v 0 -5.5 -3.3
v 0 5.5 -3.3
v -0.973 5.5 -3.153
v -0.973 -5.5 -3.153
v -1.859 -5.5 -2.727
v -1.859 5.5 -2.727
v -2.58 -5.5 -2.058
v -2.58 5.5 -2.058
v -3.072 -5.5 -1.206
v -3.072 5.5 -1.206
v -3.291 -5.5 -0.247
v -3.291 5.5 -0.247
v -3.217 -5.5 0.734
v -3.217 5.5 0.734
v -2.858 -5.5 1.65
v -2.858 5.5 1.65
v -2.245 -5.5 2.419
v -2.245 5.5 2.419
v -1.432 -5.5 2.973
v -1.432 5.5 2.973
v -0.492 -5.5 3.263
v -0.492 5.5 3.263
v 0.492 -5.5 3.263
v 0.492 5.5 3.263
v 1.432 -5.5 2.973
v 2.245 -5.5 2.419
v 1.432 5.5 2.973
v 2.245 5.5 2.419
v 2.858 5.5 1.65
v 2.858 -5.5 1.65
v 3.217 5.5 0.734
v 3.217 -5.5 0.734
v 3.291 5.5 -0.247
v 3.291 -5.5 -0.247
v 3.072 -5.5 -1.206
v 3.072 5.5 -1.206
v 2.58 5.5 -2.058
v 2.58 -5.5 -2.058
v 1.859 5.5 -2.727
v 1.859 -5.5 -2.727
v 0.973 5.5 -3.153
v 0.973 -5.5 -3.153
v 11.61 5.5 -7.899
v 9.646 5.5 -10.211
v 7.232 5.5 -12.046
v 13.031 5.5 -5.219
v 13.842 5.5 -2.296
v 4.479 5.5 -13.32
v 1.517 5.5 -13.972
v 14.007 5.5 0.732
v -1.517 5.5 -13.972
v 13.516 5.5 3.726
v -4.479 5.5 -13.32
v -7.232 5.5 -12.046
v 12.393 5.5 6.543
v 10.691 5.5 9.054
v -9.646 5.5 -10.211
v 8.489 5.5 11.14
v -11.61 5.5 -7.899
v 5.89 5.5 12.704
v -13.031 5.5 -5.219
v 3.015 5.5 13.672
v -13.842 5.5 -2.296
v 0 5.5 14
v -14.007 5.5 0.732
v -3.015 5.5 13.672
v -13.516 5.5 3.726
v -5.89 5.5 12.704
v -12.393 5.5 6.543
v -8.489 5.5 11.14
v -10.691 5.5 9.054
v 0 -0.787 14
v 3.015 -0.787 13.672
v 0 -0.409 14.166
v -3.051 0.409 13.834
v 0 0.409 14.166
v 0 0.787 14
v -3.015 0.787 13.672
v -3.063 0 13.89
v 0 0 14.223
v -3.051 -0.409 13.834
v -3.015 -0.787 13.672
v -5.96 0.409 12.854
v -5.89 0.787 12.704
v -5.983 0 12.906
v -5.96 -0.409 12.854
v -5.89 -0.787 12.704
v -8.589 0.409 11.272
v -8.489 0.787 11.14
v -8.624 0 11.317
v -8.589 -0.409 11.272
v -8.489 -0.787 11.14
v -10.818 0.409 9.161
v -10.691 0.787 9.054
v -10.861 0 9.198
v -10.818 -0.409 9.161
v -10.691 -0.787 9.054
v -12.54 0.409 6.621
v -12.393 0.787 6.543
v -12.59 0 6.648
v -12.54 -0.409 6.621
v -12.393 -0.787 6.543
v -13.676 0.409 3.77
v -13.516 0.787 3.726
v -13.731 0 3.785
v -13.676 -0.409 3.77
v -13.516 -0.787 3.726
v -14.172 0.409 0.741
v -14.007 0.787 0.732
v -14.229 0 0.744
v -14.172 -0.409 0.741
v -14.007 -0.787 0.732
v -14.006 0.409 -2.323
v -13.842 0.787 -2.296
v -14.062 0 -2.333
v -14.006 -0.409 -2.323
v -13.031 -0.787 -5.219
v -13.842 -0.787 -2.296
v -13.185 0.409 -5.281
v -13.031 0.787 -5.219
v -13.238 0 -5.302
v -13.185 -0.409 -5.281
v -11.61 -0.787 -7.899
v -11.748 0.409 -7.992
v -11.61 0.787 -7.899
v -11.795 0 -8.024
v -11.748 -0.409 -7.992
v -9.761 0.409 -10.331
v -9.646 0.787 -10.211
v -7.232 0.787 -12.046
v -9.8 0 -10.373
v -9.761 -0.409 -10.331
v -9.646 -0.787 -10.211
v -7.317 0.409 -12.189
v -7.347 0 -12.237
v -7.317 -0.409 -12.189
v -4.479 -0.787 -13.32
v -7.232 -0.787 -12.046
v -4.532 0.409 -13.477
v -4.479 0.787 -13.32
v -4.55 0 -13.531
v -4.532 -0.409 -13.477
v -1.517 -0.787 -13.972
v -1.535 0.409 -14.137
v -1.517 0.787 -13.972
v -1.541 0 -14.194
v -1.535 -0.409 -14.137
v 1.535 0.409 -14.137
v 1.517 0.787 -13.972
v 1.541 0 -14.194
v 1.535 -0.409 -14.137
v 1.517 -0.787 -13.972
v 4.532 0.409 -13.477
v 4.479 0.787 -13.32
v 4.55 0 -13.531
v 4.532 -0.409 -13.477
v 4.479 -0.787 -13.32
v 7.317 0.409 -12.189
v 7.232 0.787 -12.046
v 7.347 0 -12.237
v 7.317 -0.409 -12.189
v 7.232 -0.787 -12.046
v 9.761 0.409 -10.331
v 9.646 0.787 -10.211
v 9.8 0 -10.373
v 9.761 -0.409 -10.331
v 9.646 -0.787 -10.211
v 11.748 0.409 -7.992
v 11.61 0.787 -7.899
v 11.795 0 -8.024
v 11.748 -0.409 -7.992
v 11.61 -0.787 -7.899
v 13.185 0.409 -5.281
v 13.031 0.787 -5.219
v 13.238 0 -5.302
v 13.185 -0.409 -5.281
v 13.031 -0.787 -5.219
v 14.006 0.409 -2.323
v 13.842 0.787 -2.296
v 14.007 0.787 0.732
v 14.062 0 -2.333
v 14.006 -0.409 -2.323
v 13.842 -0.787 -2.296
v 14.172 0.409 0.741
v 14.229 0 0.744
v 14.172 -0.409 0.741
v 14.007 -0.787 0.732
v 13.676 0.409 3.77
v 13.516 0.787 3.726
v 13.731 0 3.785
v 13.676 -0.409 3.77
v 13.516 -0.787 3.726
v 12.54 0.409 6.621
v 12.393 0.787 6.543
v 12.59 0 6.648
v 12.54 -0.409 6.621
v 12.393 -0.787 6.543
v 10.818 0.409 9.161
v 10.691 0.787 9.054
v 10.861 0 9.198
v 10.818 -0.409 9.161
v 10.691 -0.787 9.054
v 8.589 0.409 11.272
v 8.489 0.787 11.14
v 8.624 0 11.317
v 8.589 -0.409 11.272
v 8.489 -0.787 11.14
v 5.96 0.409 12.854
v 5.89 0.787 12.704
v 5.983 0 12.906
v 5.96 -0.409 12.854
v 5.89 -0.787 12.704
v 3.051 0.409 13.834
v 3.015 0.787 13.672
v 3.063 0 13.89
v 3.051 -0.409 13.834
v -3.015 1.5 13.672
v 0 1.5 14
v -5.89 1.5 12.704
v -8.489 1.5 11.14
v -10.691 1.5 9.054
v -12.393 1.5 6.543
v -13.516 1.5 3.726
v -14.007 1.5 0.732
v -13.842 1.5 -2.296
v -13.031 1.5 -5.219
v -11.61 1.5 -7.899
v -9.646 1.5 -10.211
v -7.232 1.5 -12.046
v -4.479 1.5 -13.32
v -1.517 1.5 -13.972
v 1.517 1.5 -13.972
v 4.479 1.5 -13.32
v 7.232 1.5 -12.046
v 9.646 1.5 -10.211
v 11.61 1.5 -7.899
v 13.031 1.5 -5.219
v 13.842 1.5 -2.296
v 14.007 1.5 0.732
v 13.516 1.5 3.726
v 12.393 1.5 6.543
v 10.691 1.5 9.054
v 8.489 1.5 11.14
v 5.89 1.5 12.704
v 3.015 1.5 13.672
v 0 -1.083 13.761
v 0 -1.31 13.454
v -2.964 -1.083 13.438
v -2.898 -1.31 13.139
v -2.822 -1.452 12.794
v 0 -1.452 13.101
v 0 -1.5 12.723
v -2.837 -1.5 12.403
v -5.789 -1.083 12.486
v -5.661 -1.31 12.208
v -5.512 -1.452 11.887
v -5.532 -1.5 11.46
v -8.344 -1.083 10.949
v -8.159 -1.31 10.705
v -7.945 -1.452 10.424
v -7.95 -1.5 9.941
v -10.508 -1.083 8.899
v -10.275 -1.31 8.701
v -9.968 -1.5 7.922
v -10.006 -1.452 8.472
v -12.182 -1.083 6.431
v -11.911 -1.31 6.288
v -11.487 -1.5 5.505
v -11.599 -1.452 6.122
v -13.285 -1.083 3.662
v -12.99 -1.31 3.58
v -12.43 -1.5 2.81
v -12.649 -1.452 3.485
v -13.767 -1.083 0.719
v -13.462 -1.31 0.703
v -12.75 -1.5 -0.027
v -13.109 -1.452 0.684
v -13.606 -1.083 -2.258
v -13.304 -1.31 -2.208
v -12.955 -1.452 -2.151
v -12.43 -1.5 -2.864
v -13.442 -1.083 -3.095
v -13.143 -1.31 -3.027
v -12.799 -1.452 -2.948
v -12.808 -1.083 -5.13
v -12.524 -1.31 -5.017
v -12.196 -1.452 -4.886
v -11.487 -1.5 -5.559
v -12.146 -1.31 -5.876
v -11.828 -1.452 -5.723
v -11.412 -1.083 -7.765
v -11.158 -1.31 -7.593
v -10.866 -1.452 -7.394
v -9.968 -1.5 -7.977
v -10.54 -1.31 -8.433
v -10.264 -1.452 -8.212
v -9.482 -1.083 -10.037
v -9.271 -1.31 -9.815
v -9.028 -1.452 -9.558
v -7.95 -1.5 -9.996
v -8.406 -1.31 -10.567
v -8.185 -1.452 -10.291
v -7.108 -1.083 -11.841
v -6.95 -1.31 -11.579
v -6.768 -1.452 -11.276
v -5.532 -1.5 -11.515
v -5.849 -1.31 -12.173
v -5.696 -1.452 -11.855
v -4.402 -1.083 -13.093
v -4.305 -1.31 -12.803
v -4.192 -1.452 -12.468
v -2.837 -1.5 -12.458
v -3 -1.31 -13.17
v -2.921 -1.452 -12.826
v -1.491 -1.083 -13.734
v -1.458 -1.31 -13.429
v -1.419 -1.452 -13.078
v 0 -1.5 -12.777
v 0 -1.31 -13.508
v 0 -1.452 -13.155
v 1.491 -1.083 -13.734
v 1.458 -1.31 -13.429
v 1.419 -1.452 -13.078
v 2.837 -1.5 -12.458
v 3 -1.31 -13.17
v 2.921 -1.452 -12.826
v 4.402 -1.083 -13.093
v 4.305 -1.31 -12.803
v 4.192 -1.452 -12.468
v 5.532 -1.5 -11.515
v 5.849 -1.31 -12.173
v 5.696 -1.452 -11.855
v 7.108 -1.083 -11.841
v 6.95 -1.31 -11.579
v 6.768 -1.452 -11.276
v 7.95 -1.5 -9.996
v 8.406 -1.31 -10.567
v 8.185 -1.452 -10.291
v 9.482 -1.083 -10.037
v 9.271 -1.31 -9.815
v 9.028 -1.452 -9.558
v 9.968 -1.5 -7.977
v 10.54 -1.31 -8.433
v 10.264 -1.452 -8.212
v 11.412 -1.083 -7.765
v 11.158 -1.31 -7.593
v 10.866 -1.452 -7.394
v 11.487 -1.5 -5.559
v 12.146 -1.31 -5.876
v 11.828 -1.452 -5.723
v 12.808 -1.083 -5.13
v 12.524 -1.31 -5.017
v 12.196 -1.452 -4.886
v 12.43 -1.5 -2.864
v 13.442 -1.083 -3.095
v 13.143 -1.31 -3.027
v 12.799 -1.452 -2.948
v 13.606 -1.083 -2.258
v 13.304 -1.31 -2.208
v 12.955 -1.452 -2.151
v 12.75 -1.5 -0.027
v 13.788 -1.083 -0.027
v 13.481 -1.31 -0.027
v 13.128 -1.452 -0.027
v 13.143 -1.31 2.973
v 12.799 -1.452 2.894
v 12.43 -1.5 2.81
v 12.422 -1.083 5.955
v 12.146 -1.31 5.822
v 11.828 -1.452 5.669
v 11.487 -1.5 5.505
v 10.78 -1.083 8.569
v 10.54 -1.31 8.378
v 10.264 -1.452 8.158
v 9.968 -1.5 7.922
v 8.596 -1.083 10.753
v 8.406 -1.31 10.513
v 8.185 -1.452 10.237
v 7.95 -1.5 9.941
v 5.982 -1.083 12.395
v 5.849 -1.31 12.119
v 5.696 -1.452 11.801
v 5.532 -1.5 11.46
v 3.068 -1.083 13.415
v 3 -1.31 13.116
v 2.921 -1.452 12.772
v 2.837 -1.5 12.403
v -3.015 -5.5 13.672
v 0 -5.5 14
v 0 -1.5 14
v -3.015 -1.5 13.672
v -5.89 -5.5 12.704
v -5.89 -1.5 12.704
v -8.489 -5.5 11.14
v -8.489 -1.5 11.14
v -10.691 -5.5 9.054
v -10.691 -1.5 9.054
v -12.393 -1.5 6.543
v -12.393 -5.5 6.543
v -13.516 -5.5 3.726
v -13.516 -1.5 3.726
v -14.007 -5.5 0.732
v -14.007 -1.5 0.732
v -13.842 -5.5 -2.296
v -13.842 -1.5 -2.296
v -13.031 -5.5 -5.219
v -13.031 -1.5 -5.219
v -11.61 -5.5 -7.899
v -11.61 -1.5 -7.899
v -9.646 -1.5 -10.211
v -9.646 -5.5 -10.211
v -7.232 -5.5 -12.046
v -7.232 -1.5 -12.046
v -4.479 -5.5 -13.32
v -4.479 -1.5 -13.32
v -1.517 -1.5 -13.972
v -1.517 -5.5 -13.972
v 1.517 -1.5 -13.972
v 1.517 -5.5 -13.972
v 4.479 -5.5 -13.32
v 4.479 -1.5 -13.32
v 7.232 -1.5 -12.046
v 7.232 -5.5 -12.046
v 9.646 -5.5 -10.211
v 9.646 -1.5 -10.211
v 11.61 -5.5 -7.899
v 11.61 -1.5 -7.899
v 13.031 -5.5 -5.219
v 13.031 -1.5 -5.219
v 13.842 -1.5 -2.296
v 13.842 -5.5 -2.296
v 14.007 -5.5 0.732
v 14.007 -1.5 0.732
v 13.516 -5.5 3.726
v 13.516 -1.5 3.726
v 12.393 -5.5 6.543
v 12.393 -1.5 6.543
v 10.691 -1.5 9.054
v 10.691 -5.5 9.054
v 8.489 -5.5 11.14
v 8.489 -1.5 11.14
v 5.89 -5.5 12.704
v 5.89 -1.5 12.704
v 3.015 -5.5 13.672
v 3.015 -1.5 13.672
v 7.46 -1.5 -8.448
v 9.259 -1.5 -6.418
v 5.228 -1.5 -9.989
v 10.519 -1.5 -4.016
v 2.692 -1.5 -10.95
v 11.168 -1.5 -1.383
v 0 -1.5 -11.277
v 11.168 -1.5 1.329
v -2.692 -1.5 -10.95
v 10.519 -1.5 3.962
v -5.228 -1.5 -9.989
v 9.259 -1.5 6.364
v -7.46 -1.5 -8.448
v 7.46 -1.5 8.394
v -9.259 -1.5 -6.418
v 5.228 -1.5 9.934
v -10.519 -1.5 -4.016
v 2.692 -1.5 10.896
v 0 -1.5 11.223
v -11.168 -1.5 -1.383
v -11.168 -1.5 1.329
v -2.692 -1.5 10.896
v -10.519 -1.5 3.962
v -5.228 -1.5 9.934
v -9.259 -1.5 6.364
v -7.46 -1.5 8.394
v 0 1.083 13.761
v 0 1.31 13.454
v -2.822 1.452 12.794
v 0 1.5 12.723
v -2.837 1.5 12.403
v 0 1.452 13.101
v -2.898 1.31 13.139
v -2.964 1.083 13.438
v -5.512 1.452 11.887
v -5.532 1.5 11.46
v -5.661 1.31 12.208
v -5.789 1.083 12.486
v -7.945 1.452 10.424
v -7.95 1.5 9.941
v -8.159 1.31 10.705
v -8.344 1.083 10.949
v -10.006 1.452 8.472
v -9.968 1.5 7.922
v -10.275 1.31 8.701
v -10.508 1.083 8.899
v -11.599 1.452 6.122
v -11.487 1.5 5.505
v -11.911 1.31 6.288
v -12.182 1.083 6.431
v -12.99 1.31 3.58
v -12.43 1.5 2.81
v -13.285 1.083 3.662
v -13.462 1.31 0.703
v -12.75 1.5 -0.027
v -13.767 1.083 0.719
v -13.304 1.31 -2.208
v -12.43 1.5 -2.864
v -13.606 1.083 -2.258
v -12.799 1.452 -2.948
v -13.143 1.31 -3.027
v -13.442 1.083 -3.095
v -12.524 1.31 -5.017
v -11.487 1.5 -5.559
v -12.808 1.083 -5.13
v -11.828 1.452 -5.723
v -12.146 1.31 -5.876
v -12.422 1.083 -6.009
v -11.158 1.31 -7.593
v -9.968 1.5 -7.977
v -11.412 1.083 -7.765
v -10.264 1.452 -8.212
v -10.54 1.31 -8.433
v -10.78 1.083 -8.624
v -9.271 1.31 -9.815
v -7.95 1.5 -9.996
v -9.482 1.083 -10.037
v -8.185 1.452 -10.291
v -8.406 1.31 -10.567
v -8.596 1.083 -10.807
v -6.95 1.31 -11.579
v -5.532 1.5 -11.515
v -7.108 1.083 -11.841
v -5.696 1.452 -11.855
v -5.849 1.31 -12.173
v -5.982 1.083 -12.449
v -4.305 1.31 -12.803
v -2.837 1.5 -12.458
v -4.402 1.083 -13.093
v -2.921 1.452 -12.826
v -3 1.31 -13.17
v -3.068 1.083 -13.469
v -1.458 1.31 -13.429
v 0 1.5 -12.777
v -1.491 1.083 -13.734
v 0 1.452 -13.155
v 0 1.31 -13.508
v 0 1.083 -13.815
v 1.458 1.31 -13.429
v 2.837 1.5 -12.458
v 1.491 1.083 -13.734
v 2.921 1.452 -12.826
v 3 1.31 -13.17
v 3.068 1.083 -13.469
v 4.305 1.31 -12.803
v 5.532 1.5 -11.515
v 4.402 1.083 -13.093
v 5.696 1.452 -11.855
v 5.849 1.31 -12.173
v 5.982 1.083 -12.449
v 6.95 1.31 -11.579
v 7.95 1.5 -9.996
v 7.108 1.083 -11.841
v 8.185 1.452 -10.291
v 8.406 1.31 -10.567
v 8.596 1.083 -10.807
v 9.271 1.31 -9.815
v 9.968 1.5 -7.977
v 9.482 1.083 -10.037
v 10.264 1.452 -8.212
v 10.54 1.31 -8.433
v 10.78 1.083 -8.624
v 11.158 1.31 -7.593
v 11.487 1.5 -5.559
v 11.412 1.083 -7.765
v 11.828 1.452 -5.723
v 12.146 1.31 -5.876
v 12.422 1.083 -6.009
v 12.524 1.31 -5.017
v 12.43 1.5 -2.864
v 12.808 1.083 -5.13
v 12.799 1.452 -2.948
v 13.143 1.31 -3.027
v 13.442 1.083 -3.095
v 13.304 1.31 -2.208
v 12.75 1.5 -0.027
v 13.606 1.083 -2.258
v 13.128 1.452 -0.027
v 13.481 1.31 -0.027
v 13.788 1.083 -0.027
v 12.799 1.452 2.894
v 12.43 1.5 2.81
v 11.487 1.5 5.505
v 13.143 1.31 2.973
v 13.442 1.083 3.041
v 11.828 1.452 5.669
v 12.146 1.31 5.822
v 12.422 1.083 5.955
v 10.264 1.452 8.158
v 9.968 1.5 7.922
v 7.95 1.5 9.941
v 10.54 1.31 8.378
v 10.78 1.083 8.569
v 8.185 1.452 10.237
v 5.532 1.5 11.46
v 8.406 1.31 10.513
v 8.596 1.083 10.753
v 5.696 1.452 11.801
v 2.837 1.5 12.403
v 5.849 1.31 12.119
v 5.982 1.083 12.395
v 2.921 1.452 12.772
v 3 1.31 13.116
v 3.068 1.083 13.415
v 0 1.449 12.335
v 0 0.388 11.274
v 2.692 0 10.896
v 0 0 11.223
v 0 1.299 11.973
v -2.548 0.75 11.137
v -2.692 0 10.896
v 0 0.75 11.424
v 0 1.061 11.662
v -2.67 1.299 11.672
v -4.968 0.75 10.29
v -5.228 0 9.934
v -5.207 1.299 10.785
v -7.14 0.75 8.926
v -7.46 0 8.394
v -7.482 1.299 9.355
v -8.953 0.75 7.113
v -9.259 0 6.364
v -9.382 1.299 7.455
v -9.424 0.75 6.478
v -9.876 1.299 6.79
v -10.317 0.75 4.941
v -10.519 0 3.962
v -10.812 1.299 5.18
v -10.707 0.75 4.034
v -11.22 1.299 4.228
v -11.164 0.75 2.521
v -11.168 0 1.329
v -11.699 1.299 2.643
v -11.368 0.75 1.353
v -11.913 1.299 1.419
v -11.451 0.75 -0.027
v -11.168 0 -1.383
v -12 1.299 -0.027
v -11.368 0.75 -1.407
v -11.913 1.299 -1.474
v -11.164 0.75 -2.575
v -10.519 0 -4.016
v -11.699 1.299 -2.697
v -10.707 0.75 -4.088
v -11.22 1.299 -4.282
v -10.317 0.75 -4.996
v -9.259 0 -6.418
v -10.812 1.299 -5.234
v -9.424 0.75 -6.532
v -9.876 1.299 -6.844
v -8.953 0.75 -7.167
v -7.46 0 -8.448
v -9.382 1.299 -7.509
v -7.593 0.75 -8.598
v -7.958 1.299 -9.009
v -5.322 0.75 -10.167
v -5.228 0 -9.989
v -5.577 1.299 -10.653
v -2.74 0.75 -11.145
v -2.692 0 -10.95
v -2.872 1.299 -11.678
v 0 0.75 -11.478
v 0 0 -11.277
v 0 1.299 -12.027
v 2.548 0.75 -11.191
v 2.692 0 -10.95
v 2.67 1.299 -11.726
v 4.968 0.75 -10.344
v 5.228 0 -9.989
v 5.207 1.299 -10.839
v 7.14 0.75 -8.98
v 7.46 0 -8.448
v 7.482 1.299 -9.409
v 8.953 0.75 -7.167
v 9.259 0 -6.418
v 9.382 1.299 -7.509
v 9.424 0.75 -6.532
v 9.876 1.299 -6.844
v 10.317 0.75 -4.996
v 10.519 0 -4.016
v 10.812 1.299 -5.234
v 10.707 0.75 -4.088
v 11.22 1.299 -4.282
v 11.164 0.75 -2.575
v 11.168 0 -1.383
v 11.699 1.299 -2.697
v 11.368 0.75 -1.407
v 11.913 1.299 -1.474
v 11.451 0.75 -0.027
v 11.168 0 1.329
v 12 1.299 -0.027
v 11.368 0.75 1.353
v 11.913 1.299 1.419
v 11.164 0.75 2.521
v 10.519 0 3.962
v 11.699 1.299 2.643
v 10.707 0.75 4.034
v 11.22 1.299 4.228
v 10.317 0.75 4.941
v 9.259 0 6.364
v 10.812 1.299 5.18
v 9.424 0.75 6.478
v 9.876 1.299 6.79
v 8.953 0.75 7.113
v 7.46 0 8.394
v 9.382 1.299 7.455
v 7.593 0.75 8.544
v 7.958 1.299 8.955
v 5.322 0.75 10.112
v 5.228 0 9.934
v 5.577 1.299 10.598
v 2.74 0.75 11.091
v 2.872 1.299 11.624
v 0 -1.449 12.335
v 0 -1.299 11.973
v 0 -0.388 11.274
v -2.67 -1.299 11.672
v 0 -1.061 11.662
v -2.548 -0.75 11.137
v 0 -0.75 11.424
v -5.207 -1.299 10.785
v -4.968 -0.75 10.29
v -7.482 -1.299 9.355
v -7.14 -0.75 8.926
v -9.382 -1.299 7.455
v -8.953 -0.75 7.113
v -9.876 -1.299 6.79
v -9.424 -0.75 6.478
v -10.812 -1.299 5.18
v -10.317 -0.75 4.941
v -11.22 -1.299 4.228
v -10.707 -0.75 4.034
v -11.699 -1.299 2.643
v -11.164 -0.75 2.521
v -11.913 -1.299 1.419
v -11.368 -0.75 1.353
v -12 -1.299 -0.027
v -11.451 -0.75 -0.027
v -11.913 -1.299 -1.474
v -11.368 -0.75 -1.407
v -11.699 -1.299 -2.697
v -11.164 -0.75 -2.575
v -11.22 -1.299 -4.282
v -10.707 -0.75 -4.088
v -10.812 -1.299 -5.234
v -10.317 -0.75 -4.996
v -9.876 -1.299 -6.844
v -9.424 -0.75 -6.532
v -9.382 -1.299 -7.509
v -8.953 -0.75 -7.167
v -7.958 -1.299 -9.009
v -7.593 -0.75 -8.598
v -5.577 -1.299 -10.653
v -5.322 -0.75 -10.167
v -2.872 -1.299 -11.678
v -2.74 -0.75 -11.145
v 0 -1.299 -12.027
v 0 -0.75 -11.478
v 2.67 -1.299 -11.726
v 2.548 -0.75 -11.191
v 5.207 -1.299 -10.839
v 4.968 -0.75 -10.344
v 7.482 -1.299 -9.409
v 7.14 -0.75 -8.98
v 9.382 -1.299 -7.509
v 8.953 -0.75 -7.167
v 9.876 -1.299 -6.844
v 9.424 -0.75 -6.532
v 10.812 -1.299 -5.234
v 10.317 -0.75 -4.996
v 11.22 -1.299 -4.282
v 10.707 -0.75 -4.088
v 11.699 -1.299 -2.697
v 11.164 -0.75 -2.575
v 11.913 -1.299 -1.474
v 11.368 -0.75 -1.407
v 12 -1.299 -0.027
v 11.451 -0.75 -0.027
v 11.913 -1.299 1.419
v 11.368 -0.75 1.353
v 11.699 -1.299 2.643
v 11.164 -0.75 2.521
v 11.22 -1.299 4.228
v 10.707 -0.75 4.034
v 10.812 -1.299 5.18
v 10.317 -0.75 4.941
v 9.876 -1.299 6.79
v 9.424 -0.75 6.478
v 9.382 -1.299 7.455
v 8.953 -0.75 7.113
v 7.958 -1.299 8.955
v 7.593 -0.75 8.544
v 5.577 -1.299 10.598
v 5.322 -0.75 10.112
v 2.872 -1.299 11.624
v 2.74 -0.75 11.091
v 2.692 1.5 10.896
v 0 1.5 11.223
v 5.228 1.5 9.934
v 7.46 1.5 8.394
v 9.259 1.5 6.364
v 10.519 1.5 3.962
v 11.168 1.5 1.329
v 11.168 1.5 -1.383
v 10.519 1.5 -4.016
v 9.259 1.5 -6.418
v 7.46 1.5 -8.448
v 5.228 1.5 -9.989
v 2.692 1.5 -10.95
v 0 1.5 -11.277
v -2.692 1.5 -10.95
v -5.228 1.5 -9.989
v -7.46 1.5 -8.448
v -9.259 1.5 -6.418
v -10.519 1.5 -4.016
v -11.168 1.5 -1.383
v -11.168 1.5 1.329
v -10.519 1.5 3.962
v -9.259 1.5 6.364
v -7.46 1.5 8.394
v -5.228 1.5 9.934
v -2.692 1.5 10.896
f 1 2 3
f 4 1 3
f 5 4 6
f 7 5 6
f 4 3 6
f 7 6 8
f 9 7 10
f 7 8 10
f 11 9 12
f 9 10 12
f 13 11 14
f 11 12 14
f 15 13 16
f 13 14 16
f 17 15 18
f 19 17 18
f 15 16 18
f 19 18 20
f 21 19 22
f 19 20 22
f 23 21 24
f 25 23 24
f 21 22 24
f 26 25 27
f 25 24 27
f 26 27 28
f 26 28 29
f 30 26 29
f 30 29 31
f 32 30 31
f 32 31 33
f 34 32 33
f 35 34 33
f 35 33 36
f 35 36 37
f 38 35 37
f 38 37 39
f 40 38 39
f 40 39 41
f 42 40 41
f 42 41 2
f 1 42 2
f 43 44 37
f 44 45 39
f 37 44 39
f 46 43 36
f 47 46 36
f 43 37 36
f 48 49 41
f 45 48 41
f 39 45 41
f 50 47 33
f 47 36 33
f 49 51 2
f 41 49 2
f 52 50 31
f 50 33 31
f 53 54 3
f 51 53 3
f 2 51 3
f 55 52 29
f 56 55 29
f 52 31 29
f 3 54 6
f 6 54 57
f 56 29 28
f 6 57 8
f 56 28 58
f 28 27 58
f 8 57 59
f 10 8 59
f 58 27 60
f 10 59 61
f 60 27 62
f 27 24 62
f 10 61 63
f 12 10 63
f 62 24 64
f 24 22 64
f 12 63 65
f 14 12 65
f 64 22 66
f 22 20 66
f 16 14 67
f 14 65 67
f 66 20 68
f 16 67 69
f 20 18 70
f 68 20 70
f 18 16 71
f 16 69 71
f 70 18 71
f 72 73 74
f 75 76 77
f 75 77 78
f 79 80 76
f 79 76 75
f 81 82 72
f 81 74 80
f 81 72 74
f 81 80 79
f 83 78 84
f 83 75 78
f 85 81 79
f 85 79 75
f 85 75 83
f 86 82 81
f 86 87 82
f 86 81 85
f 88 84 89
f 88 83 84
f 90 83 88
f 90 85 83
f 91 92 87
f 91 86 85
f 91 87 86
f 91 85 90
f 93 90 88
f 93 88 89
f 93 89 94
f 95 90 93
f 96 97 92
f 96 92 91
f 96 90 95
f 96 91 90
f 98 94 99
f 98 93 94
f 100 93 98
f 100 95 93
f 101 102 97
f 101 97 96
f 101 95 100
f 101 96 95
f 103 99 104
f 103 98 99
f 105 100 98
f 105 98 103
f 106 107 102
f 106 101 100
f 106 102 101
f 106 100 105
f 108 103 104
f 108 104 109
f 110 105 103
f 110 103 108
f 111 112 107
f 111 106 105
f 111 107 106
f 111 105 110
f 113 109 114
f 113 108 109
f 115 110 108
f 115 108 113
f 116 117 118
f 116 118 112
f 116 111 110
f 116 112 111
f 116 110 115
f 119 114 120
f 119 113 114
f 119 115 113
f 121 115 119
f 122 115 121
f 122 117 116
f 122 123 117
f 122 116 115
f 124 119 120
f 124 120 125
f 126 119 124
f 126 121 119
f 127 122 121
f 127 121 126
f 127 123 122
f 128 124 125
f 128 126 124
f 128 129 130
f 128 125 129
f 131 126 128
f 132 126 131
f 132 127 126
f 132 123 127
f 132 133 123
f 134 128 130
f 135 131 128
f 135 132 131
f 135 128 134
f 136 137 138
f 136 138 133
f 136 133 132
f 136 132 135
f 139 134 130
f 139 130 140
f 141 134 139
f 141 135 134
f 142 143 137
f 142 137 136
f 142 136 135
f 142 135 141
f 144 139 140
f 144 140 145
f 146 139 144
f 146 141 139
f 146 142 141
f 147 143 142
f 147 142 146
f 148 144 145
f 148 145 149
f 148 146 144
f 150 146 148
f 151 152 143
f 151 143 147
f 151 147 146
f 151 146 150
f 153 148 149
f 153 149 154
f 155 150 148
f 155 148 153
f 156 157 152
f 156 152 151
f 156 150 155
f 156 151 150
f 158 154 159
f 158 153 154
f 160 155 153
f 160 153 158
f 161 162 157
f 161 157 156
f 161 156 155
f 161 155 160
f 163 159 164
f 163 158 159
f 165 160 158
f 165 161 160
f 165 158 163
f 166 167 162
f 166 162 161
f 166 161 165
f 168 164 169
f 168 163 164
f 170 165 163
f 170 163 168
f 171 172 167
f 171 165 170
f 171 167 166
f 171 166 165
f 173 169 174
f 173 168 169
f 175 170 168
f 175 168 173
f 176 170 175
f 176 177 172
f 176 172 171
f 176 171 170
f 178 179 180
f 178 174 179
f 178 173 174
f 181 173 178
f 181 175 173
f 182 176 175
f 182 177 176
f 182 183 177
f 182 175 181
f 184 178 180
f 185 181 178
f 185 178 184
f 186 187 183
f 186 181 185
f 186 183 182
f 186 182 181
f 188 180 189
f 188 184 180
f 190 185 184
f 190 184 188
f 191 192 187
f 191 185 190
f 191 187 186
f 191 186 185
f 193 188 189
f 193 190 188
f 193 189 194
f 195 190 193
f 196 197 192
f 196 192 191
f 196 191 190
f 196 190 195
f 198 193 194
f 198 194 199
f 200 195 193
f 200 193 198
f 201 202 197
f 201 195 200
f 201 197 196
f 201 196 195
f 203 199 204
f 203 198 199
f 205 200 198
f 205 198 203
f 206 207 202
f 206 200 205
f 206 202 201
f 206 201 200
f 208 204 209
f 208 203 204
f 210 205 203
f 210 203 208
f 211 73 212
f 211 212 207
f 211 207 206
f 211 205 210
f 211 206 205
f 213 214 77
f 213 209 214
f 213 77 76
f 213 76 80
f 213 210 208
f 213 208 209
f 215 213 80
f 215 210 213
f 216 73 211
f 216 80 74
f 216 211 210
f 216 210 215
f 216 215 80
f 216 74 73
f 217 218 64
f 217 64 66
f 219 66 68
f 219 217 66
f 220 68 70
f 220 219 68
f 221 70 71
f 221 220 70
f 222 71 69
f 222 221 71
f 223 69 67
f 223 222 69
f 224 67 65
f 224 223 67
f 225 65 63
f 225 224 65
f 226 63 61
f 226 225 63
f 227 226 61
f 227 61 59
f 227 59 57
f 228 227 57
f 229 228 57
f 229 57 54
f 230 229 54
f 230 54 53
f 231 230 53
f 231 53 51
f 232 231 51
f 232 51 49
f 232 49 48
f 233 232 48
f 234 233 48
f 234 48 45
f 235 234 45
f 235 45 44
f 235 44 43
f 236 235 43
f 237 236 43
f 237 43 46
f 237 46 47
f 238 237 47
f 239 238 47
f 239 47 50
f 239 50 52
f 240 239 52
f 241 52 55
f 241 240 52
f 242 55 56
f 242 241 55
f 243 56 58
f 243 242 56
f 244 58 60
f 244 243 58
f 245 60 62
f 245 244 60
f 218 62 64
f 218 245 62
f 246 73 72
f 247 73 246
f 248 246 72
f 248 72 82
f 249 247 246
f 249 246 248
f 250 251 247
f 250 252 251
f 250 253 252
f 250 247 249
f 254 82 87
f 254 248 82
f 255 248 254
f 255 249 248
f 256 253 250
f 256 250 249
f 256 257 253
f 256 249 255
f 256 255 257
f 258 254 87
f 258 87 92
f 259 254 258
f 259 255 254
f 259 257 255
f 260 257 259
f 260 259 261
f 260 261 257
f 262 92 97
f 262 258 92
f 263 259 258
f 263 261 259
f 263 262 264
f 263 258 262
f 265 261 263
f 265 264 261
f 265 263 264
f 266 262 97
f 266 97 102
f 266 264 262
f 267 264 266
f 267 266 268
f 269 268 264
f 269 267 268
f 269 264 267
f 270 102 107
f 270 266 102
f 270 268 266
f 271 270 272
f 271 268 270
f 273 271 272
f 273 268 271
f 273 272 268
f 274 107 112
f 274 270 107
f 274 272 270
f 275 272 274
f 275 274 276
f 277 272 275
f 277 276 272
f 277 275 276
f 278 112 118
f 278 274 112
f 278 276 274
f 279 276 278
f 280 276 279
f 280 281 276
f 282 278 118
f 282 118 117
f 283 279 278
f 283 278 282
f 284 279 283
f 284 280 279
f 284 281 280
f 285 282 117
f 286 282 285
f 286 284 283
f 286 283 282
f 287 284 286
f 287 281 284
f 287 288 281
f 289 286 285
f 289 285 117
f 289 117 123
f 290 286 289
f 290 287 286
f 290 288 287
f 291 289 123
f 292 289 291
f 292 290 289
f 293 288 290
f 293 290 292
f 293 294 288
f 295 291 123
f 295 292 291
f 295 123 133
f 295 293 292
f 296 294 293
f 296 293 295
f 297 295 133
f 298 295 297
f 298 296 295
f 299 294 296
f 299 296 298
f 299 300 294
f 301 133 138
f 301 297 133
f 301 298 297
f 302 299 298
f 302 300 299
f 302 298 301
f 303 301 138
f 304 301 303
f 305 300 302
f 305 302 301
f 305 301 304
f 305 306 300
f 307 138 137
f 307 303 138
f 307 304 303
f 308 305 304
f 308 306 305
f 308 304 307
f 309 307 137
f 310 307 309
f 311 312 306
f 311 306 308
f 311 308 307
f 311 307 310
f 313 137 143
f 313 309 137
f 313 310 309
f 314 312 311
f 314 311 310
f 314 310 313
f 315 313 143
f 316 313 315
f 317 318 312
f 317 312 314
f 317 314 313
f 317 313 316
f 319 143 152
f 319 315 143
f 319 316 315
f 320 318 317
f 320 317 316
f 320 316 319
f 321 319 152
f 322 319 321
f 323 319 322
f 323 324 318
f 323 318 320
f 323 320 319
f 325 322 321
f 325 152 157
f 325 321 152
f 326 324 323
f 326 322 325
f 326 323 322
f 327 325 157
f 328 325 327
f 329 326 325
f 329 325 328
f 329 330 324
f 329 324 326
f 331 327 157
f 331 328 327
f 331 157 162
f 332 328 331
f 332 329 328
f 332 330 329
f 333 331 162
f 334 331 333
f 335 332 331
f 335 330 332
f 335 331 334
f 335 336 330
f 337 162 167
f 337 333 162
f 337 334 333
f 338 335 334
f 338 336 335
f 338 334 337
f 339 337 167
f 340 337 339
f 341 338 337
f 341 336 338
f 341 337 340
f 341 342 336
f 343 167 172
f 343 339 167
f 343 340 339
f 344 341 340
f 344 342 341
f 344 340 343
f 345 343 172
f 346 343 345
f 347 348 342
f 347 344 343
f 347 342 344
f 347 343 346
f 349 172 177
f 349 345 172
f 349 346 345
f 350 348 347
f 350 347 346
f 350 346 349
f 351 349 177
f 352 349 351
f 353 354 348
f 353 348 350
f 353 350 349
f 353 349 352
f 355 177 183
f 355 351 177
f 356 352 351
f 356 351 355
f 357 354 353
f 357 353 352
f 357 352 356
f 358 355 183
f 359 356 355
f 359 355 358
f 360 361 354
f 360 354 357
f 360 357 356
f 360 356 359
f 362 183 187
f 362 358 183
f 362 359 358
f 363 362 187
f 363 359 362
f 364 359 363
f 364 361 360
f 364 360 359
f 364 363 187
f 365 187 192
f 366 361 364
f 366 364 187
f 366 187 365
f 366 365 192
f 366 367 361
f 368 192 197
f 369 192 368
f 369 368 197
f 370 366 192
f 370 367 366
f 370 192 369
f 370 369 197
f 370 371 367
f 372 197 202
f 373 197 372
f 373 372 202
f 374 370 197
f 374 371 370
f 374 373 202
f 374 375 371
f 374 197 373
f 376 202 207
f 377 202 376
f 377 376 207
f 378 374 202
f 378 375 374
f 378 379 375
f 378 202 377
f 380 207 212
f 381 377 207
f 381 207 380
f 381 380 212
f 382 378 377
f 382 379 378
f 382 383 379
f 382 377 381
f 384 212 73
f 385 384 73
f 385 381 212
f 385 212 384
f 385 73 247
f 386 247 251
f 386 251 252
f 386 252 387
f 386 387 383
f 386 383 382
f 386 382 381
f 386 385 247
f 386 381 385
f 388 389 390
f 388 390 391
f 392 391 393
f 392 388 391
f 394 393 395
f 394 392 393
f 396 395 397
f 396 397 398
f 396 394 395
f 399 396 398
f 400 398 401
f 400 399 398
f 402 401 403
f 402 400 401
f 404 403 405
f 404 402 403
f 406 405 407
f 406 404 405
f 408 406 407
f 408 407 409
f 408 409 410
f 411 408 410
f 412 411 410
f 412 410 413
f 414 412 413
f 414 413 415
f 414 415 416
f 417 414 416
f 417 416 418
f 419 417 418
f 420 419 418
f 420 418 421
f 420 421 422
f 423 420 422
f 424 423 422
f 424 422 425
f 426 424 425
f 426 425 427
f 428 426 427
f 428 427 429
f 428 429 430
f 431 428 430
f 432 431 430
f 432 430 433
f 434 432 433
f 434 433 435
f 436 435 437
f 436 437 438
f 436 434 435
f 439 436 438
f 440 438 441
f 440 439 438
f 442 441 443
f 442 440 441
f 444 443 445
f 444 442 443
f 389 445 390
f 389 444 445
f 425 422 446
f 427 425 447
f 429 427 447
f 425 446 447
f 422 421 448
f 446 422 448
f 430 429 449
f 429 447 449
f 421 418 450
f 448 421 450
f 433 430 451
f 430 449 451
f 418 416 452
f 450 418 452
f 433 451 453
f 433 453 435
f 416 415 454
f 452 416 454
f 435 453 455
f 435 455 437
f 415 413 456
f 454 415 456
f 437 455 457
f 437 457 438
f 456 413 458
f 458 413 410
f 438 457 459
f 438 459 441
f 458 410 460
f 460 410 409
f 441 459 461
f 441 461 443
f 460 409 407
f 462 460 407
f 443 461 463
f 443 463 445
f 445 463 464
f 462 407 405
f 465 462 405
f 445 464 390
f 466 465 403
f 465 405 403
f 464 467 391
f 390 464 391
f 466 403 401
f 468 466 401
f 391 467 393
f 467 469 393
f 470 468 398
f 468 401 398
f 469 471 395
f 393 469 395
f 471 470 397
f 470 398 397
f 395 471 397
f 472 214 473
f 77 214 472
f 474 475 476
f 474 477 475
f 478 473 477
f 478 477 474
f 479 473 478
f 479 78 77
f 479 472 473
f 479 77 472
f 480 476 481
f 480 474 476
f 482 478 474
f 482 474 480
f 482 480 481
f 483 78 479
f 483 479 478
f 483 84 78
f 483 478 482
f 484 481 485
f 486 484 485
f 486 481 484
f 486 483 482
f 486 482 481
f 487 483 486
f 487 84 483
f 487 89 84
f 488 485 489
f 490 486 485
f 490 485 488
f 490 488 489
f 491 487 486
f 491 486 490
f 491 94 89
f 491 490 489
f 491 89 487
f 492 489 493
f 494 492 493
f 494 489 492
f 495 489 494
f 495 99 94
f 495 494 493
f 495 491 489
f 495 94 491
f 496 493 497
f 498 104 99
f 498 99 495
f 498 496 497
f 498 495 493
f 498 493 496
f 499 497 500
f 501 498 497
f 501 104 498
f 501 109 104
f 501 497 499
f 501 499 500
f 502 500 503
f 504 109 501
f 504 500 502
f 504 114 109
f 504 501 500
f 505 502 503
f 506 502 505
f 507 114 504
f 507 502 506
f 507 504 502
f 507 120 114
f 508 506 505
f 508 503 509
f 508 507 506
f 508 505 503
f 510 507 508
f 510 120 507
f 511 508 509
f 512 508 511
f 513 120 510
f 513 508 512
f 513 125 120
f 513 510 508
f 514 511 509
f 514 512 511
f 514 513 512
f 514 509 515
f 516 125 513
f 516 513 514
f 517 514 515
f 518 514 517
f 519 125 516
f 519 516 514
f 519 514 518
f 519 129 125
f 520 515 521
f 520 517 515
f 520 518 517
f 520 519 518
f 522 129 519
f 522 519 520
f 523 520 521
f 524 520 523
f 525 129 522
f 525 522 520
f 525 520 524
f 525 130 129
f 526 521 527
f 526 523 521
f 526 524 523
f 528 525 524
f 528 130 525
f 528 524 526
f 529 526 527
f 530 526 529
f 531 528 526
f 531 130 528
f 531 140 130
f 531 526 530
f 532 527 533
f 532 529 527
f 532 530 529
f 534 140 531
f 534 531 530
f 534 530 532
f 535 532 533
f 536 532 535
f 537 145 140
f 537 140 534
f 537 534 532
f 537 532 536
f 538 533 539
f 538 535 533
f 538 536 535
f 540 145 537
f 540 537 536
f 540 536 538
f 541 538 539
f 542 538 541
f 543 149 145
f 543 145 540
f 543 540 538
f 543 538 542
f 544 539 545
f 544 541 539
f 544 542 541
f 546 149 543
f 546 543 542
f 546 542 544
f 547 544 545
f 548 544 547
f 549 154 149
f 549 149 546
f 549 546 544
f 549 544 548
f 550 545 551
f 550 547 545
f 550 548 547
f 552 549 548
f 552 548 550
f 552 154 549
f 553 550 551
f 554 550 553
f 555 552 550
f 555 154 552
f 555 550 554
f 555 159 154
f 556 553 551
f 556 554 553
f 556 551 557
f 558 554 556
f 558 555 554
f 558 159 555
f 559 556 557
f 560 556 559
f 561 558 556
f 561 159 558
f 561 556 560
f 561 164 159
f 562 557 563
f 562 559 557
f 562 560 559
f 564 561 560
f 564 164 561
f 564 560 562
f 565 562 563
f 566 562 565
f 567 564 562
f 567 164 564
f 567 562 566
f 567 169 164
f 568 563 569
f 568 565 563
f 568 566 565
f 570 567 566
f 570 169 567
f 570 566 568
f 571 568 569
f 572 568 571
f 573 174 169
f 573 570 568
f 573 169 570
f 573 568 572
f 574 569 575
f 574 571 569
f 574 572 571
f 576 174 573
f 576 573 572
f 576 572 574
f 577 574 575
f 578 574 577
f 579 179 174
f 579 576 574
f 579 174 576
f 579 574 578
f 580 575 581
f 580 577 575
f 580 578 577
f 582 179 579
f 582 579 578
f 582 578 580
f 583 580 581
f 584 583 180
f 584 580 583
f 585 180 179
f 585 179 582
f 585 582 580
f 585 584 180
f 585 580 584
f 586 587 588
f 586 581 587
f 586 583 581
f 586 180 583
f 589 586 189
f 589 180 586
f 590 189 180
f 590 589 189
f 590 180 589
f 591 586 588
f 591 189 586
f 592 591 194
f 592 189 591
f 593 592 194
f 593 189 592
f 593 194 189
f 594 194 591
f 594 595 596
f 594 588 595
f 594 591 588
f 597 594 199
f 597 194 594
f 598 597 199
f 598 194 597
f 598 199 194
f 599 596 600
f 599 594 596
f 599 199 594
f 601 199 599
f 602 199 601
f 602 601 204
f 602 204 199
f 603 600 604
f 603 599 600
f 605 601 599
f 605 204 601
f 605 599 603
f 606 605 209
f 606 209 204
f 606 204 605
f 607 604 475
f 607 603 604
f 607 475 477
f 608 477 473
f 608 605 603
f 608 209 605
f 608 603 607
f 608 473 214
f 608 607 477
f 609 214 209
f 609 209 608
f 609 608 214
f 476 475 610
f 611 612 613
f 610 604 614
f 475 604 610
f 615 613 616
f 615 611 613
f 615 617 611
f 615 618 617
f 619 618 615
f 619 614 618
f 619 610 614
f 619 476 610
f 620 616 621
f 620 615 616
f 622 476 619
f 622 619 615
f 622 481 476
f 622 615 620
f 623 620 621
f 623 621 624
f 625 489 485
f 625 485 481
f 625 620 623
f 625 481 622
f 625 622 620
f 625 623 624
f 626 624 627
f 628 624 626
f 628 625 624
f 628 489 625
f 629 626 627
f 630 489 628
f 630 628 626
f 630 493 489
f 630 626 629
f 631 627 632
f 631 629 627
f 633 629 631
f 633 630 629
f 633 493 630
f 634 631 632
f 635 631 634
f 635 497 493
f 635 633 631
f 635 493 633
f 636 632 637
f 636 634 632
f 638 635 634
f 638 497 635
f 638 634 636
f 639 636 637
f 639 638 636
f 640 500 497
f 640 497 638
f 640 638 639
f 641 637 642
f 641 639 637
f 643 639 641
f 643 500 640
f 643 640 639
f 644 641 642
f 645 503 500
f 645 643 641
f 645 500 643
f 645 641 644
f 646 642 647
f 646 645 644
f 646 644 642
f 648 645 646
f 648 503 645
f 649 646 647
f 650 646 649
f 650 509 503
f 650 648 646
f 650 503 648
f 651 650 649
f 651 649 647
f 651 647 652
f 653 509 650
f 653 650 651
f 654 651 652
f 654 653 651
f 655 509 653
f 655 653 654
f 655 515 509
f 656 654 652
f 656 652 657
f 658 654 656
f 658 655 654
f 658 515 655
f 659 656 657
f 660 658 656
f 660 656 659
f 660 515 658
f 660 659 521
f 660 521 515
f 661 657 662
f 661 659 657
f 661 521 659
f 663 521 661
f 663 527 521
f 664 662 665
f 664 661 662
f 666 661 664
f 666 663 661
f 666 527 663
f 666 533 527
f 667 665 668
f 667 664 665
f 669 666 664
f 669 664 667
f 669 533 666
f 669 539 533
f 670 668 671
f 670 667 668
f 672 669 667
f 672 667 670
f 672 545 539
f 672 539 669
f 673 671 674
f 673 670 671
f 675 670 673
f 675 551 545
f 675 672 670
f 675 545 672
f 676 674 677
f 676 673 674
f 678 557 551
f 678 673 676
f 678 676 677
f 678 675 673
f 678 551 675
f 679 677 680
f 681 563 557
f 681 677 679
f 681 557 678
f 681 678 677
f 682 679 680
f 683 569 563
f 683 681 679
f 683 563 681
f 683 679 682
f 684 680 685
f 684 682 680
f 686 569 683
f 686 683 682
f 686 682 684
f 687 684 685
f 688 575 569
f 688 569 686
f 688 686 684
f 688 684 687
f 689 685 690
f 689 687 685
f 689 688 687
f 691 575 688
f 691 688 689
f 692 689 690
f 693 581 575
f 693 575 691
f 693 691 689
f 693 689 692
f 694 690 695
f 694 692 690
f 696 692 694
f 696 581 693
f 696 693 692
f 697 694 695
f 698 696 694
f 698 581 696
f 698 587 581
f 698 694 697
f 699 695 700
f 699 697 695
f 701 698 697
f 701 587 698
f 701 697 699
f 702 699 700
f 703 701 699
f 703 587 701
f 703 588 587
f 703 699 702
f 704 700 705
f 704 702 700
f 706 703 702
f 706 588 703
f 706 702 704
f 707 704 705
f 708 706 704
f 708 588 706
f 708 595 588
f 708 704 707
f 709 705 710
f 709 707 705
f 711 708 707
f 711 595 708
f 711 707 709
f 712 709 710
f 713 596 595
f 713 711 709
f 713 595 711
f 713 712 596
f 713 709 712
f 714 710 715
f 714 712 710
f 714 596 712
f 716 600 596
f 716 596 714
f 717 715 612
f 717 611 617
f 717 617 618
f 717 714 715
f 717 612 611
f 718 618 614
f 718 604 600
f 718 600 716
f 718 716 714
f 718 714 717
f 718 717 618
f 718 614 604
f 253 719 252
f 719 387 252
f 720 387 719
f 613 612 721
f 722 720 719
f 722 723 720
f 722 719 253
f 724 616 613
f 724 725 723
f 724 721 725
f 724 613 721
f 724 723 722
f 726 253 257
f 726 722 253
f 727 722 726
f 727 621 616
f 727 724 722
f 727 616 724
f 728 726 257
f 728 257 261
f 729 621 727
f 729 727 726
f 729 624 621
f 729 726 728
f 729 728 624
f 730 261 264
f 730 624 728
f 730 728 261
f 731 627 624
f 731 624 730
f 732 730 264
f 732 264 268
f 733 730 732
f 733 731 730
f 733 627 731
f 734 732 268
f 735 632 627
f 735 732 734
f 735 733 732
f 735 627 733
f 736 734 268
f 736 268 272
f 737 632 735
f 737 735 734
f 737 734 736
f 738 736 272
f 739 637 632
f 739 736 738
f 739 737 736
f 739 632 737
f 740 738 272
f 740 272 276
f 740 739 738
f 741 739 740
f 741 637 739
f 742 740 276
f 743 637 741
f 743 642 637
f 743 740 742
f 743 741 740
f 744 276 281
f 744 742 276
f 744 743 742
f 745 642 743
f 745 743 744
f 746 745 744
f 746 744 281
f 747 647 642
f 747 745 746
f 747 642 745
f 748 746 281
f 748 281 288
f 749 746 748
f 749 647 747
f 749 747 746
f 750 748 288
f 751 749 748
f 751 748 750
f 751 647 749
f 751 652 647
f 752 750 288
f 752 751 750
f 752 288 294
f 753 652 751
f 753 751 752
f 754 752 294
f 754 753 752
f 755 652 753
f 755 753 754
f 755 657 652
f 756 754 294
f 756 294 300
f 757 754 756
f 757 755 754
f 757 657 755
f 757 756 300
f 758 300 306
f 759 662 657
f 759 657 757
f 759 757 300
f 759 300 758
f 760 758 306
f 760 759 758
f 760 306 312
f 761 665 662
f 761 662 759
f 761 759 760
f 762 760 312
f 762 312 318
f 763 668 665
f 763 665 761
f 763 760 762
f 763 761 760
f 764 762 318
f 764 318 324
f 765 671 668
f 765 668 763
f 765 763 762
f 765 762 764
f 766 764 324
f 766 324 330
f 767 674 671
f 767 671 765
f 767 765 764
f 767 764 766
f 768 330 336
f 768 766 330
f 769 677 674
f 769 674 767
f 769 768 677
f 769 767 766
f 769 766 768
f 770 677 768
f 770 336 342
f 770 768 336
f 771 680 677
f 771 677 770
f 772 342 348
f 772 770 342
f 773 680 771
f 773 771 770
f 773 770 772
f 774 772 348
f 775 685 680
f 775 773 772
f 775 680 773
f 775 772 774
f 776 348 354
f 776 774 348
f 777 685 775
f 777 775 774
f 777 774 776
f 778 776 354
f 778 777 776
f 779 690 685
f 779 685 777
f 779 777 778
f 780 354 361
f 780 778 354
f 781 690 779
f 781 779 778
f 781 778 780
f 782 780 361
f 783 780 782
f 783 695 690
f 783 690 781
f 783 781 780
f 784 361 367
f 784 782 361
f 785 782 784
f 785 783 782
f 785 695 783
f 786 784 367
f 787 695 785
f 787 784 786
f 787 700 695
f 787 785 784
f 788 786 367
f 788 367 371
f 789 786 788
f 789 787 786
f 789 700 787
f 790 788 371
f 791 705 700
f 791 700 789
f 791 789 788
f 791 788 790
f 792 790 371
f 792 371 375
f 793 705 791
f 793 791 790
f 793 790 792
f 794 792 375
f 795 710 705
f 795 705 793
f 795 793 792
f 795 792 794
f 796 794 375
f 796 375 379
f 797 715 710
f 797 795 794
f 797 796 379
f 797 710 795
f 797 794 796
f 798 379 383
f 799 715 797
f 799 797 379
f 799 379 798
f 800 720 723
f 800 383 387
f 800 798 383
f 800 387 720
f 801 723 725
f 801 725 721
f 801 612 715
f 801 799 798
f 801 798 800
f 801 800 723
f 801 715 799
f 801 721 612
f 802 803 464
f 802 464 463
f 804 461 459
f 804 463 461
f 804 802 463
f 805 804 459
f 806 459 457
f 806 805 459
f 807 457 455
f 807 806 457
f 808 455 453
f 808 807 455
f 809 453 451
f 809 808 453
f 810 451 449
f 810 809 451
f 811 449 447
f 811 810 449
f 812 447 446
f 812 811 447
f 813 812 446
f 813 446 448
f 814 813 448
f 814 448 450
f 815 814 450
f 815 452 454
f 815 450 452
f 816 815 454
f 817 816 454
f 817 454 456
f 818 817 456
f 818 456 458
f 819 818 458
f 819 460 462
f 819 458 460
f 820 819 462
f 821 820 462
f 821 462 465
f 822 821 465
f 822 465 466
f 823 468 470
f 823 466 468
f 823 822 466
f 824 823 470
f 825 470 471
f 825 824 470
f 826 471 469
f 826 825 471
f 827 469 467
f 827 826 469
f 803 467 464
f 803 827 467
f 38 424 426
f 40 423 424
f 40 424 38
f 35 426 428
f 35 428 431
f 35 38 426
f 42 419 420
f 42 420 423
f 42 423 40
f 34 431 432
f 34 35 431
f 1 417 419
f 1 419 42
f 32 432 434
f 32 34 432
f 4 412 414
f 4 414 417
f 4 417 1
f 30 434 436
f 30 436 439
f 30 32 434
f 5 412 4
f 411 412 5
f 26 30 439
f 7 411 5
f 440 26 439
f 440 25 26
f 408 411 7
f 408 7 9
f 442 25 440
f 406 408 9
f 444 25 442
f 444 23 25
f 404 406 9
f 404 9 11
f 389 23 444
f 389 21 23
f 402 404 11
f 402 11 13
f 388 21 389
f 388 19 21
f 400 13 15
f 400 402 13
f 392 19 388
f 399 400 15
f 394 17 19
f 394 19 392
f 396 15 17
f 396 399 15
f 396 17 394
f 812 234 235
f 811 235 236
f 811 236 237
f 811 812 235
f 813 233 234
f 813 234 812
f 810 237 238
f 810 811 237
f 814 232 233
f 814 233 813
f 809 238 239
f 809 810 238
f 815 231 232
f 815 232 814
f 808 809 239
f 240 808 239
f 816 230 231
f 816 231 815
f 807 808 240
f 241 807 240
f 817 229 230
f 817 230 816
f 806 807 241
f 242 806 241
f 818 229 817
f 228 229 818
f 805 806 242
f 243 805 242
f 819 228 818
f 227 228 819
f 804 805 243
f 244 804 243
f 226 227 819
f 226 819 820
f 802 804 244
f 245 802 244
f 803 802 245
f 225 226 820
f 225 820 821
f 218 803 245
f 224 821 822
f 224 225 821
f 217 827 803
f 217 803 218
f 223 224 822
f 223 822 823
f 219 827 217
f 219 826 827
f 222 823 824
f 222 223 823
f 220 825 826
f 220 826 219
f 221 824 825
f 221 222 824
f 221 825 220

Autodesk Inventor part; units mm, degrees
ref_plane "YZ Plane" through (0, 0, 0) normal (1, 0, 0) x (0, 1, 0)
ref_plane "XZ Plane" through (0, 0, 0) normal (0, 1, 0) x (-1, 0, 0)
ref_plane "XY Plane" through (0, 0, 0) normal (0, 0, 1) x (1, 0, 0)
sketch "Skizze1" plane through (0, 0, 0) normal (1, 0, 0) x (0, 1, 0)
  line L0 (5.5, 14) -> (-5.5, 14)
  line L1 (-5.5, 14) -> (5.5, 14)
  line L2 (5.5, 14) -> (5.5, -0.0271)
  line L3 (5.5, -0.0271) -> (-5.5, -0.0271)
  line L4 (-5.5, -0.0271) -> (-5.5, 14)
  line L5 (0, -0.0271) -> (0, 14.2229)
  line L6 (0, -0.0271) -> (14.25, -0.0271) construction
  line L7 (-1.5, 11.223) -> (1.5, 11.223)
  line L8 (1.5, 11.223) -> (1.5, 14)
  line L9 (1.5, 14) -> (-1.5, 14)
  line L10 (-1.5, 14) -> (-1.5, 11.223)
  point P0 (0, 11.223)
  dimension "d0" = 11
  dimension "d2" = 14.25
  dimension "d3" = 90
  dimension "d4" = 3
  dimension "d5" = 4
  dimension "d6" = 4
revolve "Umdrehung1" add sketch "Skizze1" angle 360 about axis through (0, 5.5, -0.0271) along (0, -1, 0) contours L2 L3 L5 L7 L8 L0 | L3 L4 L0 L10 L7 L5
sketch "Skizze2" plane through (0, 0, 0) normal (1, 0, 0) x (0, 1, 0)
  line L0 (-1.5, 14) -> (-1.5, -14.0543) projected
  line L1 (1.5, 11.223) -> (-1.5, 11.223) projected
  line L2 (-1.5, 14) -> (1.5, 14)
  line L3 (1.5, 14) -> (1.5, 11.223)
  line L4 (1.5, 11.223) -> (-1.5, 11.223)
  line L5 (-1.5, 11.223) -> (-1.5, 14)
  circle A0 centre (0, 11.223) radius 1.5 construction
  circle A1 centre (0, 12.723) radius 1.5
  line L6 (6.3814, -0.0271) -> (7.4882, -0.0271) construction
  point P0 (0, 0)
revolve "Umdrehung2" add sketch "Skizze2" angle 360 about axis through (0, 6.3814, -0.0271) along (0, 1, 0) separate body contours A1 L2 | A1 L2
sketch "Skizze3" plane through (0, -5.5, -0.0271) normal (0, -1, 0) x (1, 0, 0)
  point P0 (0, 0.0271)
hole "Bohrung1" at (0, -5.5, 0) direction (0, 1, 0) diameter 6.6 depth 11 bodies 1 clearance for "Flachkopfsenkschraube ISO 2009/7046" size "M6" standard "ISO"
properties part number "sf_Piston_1"
